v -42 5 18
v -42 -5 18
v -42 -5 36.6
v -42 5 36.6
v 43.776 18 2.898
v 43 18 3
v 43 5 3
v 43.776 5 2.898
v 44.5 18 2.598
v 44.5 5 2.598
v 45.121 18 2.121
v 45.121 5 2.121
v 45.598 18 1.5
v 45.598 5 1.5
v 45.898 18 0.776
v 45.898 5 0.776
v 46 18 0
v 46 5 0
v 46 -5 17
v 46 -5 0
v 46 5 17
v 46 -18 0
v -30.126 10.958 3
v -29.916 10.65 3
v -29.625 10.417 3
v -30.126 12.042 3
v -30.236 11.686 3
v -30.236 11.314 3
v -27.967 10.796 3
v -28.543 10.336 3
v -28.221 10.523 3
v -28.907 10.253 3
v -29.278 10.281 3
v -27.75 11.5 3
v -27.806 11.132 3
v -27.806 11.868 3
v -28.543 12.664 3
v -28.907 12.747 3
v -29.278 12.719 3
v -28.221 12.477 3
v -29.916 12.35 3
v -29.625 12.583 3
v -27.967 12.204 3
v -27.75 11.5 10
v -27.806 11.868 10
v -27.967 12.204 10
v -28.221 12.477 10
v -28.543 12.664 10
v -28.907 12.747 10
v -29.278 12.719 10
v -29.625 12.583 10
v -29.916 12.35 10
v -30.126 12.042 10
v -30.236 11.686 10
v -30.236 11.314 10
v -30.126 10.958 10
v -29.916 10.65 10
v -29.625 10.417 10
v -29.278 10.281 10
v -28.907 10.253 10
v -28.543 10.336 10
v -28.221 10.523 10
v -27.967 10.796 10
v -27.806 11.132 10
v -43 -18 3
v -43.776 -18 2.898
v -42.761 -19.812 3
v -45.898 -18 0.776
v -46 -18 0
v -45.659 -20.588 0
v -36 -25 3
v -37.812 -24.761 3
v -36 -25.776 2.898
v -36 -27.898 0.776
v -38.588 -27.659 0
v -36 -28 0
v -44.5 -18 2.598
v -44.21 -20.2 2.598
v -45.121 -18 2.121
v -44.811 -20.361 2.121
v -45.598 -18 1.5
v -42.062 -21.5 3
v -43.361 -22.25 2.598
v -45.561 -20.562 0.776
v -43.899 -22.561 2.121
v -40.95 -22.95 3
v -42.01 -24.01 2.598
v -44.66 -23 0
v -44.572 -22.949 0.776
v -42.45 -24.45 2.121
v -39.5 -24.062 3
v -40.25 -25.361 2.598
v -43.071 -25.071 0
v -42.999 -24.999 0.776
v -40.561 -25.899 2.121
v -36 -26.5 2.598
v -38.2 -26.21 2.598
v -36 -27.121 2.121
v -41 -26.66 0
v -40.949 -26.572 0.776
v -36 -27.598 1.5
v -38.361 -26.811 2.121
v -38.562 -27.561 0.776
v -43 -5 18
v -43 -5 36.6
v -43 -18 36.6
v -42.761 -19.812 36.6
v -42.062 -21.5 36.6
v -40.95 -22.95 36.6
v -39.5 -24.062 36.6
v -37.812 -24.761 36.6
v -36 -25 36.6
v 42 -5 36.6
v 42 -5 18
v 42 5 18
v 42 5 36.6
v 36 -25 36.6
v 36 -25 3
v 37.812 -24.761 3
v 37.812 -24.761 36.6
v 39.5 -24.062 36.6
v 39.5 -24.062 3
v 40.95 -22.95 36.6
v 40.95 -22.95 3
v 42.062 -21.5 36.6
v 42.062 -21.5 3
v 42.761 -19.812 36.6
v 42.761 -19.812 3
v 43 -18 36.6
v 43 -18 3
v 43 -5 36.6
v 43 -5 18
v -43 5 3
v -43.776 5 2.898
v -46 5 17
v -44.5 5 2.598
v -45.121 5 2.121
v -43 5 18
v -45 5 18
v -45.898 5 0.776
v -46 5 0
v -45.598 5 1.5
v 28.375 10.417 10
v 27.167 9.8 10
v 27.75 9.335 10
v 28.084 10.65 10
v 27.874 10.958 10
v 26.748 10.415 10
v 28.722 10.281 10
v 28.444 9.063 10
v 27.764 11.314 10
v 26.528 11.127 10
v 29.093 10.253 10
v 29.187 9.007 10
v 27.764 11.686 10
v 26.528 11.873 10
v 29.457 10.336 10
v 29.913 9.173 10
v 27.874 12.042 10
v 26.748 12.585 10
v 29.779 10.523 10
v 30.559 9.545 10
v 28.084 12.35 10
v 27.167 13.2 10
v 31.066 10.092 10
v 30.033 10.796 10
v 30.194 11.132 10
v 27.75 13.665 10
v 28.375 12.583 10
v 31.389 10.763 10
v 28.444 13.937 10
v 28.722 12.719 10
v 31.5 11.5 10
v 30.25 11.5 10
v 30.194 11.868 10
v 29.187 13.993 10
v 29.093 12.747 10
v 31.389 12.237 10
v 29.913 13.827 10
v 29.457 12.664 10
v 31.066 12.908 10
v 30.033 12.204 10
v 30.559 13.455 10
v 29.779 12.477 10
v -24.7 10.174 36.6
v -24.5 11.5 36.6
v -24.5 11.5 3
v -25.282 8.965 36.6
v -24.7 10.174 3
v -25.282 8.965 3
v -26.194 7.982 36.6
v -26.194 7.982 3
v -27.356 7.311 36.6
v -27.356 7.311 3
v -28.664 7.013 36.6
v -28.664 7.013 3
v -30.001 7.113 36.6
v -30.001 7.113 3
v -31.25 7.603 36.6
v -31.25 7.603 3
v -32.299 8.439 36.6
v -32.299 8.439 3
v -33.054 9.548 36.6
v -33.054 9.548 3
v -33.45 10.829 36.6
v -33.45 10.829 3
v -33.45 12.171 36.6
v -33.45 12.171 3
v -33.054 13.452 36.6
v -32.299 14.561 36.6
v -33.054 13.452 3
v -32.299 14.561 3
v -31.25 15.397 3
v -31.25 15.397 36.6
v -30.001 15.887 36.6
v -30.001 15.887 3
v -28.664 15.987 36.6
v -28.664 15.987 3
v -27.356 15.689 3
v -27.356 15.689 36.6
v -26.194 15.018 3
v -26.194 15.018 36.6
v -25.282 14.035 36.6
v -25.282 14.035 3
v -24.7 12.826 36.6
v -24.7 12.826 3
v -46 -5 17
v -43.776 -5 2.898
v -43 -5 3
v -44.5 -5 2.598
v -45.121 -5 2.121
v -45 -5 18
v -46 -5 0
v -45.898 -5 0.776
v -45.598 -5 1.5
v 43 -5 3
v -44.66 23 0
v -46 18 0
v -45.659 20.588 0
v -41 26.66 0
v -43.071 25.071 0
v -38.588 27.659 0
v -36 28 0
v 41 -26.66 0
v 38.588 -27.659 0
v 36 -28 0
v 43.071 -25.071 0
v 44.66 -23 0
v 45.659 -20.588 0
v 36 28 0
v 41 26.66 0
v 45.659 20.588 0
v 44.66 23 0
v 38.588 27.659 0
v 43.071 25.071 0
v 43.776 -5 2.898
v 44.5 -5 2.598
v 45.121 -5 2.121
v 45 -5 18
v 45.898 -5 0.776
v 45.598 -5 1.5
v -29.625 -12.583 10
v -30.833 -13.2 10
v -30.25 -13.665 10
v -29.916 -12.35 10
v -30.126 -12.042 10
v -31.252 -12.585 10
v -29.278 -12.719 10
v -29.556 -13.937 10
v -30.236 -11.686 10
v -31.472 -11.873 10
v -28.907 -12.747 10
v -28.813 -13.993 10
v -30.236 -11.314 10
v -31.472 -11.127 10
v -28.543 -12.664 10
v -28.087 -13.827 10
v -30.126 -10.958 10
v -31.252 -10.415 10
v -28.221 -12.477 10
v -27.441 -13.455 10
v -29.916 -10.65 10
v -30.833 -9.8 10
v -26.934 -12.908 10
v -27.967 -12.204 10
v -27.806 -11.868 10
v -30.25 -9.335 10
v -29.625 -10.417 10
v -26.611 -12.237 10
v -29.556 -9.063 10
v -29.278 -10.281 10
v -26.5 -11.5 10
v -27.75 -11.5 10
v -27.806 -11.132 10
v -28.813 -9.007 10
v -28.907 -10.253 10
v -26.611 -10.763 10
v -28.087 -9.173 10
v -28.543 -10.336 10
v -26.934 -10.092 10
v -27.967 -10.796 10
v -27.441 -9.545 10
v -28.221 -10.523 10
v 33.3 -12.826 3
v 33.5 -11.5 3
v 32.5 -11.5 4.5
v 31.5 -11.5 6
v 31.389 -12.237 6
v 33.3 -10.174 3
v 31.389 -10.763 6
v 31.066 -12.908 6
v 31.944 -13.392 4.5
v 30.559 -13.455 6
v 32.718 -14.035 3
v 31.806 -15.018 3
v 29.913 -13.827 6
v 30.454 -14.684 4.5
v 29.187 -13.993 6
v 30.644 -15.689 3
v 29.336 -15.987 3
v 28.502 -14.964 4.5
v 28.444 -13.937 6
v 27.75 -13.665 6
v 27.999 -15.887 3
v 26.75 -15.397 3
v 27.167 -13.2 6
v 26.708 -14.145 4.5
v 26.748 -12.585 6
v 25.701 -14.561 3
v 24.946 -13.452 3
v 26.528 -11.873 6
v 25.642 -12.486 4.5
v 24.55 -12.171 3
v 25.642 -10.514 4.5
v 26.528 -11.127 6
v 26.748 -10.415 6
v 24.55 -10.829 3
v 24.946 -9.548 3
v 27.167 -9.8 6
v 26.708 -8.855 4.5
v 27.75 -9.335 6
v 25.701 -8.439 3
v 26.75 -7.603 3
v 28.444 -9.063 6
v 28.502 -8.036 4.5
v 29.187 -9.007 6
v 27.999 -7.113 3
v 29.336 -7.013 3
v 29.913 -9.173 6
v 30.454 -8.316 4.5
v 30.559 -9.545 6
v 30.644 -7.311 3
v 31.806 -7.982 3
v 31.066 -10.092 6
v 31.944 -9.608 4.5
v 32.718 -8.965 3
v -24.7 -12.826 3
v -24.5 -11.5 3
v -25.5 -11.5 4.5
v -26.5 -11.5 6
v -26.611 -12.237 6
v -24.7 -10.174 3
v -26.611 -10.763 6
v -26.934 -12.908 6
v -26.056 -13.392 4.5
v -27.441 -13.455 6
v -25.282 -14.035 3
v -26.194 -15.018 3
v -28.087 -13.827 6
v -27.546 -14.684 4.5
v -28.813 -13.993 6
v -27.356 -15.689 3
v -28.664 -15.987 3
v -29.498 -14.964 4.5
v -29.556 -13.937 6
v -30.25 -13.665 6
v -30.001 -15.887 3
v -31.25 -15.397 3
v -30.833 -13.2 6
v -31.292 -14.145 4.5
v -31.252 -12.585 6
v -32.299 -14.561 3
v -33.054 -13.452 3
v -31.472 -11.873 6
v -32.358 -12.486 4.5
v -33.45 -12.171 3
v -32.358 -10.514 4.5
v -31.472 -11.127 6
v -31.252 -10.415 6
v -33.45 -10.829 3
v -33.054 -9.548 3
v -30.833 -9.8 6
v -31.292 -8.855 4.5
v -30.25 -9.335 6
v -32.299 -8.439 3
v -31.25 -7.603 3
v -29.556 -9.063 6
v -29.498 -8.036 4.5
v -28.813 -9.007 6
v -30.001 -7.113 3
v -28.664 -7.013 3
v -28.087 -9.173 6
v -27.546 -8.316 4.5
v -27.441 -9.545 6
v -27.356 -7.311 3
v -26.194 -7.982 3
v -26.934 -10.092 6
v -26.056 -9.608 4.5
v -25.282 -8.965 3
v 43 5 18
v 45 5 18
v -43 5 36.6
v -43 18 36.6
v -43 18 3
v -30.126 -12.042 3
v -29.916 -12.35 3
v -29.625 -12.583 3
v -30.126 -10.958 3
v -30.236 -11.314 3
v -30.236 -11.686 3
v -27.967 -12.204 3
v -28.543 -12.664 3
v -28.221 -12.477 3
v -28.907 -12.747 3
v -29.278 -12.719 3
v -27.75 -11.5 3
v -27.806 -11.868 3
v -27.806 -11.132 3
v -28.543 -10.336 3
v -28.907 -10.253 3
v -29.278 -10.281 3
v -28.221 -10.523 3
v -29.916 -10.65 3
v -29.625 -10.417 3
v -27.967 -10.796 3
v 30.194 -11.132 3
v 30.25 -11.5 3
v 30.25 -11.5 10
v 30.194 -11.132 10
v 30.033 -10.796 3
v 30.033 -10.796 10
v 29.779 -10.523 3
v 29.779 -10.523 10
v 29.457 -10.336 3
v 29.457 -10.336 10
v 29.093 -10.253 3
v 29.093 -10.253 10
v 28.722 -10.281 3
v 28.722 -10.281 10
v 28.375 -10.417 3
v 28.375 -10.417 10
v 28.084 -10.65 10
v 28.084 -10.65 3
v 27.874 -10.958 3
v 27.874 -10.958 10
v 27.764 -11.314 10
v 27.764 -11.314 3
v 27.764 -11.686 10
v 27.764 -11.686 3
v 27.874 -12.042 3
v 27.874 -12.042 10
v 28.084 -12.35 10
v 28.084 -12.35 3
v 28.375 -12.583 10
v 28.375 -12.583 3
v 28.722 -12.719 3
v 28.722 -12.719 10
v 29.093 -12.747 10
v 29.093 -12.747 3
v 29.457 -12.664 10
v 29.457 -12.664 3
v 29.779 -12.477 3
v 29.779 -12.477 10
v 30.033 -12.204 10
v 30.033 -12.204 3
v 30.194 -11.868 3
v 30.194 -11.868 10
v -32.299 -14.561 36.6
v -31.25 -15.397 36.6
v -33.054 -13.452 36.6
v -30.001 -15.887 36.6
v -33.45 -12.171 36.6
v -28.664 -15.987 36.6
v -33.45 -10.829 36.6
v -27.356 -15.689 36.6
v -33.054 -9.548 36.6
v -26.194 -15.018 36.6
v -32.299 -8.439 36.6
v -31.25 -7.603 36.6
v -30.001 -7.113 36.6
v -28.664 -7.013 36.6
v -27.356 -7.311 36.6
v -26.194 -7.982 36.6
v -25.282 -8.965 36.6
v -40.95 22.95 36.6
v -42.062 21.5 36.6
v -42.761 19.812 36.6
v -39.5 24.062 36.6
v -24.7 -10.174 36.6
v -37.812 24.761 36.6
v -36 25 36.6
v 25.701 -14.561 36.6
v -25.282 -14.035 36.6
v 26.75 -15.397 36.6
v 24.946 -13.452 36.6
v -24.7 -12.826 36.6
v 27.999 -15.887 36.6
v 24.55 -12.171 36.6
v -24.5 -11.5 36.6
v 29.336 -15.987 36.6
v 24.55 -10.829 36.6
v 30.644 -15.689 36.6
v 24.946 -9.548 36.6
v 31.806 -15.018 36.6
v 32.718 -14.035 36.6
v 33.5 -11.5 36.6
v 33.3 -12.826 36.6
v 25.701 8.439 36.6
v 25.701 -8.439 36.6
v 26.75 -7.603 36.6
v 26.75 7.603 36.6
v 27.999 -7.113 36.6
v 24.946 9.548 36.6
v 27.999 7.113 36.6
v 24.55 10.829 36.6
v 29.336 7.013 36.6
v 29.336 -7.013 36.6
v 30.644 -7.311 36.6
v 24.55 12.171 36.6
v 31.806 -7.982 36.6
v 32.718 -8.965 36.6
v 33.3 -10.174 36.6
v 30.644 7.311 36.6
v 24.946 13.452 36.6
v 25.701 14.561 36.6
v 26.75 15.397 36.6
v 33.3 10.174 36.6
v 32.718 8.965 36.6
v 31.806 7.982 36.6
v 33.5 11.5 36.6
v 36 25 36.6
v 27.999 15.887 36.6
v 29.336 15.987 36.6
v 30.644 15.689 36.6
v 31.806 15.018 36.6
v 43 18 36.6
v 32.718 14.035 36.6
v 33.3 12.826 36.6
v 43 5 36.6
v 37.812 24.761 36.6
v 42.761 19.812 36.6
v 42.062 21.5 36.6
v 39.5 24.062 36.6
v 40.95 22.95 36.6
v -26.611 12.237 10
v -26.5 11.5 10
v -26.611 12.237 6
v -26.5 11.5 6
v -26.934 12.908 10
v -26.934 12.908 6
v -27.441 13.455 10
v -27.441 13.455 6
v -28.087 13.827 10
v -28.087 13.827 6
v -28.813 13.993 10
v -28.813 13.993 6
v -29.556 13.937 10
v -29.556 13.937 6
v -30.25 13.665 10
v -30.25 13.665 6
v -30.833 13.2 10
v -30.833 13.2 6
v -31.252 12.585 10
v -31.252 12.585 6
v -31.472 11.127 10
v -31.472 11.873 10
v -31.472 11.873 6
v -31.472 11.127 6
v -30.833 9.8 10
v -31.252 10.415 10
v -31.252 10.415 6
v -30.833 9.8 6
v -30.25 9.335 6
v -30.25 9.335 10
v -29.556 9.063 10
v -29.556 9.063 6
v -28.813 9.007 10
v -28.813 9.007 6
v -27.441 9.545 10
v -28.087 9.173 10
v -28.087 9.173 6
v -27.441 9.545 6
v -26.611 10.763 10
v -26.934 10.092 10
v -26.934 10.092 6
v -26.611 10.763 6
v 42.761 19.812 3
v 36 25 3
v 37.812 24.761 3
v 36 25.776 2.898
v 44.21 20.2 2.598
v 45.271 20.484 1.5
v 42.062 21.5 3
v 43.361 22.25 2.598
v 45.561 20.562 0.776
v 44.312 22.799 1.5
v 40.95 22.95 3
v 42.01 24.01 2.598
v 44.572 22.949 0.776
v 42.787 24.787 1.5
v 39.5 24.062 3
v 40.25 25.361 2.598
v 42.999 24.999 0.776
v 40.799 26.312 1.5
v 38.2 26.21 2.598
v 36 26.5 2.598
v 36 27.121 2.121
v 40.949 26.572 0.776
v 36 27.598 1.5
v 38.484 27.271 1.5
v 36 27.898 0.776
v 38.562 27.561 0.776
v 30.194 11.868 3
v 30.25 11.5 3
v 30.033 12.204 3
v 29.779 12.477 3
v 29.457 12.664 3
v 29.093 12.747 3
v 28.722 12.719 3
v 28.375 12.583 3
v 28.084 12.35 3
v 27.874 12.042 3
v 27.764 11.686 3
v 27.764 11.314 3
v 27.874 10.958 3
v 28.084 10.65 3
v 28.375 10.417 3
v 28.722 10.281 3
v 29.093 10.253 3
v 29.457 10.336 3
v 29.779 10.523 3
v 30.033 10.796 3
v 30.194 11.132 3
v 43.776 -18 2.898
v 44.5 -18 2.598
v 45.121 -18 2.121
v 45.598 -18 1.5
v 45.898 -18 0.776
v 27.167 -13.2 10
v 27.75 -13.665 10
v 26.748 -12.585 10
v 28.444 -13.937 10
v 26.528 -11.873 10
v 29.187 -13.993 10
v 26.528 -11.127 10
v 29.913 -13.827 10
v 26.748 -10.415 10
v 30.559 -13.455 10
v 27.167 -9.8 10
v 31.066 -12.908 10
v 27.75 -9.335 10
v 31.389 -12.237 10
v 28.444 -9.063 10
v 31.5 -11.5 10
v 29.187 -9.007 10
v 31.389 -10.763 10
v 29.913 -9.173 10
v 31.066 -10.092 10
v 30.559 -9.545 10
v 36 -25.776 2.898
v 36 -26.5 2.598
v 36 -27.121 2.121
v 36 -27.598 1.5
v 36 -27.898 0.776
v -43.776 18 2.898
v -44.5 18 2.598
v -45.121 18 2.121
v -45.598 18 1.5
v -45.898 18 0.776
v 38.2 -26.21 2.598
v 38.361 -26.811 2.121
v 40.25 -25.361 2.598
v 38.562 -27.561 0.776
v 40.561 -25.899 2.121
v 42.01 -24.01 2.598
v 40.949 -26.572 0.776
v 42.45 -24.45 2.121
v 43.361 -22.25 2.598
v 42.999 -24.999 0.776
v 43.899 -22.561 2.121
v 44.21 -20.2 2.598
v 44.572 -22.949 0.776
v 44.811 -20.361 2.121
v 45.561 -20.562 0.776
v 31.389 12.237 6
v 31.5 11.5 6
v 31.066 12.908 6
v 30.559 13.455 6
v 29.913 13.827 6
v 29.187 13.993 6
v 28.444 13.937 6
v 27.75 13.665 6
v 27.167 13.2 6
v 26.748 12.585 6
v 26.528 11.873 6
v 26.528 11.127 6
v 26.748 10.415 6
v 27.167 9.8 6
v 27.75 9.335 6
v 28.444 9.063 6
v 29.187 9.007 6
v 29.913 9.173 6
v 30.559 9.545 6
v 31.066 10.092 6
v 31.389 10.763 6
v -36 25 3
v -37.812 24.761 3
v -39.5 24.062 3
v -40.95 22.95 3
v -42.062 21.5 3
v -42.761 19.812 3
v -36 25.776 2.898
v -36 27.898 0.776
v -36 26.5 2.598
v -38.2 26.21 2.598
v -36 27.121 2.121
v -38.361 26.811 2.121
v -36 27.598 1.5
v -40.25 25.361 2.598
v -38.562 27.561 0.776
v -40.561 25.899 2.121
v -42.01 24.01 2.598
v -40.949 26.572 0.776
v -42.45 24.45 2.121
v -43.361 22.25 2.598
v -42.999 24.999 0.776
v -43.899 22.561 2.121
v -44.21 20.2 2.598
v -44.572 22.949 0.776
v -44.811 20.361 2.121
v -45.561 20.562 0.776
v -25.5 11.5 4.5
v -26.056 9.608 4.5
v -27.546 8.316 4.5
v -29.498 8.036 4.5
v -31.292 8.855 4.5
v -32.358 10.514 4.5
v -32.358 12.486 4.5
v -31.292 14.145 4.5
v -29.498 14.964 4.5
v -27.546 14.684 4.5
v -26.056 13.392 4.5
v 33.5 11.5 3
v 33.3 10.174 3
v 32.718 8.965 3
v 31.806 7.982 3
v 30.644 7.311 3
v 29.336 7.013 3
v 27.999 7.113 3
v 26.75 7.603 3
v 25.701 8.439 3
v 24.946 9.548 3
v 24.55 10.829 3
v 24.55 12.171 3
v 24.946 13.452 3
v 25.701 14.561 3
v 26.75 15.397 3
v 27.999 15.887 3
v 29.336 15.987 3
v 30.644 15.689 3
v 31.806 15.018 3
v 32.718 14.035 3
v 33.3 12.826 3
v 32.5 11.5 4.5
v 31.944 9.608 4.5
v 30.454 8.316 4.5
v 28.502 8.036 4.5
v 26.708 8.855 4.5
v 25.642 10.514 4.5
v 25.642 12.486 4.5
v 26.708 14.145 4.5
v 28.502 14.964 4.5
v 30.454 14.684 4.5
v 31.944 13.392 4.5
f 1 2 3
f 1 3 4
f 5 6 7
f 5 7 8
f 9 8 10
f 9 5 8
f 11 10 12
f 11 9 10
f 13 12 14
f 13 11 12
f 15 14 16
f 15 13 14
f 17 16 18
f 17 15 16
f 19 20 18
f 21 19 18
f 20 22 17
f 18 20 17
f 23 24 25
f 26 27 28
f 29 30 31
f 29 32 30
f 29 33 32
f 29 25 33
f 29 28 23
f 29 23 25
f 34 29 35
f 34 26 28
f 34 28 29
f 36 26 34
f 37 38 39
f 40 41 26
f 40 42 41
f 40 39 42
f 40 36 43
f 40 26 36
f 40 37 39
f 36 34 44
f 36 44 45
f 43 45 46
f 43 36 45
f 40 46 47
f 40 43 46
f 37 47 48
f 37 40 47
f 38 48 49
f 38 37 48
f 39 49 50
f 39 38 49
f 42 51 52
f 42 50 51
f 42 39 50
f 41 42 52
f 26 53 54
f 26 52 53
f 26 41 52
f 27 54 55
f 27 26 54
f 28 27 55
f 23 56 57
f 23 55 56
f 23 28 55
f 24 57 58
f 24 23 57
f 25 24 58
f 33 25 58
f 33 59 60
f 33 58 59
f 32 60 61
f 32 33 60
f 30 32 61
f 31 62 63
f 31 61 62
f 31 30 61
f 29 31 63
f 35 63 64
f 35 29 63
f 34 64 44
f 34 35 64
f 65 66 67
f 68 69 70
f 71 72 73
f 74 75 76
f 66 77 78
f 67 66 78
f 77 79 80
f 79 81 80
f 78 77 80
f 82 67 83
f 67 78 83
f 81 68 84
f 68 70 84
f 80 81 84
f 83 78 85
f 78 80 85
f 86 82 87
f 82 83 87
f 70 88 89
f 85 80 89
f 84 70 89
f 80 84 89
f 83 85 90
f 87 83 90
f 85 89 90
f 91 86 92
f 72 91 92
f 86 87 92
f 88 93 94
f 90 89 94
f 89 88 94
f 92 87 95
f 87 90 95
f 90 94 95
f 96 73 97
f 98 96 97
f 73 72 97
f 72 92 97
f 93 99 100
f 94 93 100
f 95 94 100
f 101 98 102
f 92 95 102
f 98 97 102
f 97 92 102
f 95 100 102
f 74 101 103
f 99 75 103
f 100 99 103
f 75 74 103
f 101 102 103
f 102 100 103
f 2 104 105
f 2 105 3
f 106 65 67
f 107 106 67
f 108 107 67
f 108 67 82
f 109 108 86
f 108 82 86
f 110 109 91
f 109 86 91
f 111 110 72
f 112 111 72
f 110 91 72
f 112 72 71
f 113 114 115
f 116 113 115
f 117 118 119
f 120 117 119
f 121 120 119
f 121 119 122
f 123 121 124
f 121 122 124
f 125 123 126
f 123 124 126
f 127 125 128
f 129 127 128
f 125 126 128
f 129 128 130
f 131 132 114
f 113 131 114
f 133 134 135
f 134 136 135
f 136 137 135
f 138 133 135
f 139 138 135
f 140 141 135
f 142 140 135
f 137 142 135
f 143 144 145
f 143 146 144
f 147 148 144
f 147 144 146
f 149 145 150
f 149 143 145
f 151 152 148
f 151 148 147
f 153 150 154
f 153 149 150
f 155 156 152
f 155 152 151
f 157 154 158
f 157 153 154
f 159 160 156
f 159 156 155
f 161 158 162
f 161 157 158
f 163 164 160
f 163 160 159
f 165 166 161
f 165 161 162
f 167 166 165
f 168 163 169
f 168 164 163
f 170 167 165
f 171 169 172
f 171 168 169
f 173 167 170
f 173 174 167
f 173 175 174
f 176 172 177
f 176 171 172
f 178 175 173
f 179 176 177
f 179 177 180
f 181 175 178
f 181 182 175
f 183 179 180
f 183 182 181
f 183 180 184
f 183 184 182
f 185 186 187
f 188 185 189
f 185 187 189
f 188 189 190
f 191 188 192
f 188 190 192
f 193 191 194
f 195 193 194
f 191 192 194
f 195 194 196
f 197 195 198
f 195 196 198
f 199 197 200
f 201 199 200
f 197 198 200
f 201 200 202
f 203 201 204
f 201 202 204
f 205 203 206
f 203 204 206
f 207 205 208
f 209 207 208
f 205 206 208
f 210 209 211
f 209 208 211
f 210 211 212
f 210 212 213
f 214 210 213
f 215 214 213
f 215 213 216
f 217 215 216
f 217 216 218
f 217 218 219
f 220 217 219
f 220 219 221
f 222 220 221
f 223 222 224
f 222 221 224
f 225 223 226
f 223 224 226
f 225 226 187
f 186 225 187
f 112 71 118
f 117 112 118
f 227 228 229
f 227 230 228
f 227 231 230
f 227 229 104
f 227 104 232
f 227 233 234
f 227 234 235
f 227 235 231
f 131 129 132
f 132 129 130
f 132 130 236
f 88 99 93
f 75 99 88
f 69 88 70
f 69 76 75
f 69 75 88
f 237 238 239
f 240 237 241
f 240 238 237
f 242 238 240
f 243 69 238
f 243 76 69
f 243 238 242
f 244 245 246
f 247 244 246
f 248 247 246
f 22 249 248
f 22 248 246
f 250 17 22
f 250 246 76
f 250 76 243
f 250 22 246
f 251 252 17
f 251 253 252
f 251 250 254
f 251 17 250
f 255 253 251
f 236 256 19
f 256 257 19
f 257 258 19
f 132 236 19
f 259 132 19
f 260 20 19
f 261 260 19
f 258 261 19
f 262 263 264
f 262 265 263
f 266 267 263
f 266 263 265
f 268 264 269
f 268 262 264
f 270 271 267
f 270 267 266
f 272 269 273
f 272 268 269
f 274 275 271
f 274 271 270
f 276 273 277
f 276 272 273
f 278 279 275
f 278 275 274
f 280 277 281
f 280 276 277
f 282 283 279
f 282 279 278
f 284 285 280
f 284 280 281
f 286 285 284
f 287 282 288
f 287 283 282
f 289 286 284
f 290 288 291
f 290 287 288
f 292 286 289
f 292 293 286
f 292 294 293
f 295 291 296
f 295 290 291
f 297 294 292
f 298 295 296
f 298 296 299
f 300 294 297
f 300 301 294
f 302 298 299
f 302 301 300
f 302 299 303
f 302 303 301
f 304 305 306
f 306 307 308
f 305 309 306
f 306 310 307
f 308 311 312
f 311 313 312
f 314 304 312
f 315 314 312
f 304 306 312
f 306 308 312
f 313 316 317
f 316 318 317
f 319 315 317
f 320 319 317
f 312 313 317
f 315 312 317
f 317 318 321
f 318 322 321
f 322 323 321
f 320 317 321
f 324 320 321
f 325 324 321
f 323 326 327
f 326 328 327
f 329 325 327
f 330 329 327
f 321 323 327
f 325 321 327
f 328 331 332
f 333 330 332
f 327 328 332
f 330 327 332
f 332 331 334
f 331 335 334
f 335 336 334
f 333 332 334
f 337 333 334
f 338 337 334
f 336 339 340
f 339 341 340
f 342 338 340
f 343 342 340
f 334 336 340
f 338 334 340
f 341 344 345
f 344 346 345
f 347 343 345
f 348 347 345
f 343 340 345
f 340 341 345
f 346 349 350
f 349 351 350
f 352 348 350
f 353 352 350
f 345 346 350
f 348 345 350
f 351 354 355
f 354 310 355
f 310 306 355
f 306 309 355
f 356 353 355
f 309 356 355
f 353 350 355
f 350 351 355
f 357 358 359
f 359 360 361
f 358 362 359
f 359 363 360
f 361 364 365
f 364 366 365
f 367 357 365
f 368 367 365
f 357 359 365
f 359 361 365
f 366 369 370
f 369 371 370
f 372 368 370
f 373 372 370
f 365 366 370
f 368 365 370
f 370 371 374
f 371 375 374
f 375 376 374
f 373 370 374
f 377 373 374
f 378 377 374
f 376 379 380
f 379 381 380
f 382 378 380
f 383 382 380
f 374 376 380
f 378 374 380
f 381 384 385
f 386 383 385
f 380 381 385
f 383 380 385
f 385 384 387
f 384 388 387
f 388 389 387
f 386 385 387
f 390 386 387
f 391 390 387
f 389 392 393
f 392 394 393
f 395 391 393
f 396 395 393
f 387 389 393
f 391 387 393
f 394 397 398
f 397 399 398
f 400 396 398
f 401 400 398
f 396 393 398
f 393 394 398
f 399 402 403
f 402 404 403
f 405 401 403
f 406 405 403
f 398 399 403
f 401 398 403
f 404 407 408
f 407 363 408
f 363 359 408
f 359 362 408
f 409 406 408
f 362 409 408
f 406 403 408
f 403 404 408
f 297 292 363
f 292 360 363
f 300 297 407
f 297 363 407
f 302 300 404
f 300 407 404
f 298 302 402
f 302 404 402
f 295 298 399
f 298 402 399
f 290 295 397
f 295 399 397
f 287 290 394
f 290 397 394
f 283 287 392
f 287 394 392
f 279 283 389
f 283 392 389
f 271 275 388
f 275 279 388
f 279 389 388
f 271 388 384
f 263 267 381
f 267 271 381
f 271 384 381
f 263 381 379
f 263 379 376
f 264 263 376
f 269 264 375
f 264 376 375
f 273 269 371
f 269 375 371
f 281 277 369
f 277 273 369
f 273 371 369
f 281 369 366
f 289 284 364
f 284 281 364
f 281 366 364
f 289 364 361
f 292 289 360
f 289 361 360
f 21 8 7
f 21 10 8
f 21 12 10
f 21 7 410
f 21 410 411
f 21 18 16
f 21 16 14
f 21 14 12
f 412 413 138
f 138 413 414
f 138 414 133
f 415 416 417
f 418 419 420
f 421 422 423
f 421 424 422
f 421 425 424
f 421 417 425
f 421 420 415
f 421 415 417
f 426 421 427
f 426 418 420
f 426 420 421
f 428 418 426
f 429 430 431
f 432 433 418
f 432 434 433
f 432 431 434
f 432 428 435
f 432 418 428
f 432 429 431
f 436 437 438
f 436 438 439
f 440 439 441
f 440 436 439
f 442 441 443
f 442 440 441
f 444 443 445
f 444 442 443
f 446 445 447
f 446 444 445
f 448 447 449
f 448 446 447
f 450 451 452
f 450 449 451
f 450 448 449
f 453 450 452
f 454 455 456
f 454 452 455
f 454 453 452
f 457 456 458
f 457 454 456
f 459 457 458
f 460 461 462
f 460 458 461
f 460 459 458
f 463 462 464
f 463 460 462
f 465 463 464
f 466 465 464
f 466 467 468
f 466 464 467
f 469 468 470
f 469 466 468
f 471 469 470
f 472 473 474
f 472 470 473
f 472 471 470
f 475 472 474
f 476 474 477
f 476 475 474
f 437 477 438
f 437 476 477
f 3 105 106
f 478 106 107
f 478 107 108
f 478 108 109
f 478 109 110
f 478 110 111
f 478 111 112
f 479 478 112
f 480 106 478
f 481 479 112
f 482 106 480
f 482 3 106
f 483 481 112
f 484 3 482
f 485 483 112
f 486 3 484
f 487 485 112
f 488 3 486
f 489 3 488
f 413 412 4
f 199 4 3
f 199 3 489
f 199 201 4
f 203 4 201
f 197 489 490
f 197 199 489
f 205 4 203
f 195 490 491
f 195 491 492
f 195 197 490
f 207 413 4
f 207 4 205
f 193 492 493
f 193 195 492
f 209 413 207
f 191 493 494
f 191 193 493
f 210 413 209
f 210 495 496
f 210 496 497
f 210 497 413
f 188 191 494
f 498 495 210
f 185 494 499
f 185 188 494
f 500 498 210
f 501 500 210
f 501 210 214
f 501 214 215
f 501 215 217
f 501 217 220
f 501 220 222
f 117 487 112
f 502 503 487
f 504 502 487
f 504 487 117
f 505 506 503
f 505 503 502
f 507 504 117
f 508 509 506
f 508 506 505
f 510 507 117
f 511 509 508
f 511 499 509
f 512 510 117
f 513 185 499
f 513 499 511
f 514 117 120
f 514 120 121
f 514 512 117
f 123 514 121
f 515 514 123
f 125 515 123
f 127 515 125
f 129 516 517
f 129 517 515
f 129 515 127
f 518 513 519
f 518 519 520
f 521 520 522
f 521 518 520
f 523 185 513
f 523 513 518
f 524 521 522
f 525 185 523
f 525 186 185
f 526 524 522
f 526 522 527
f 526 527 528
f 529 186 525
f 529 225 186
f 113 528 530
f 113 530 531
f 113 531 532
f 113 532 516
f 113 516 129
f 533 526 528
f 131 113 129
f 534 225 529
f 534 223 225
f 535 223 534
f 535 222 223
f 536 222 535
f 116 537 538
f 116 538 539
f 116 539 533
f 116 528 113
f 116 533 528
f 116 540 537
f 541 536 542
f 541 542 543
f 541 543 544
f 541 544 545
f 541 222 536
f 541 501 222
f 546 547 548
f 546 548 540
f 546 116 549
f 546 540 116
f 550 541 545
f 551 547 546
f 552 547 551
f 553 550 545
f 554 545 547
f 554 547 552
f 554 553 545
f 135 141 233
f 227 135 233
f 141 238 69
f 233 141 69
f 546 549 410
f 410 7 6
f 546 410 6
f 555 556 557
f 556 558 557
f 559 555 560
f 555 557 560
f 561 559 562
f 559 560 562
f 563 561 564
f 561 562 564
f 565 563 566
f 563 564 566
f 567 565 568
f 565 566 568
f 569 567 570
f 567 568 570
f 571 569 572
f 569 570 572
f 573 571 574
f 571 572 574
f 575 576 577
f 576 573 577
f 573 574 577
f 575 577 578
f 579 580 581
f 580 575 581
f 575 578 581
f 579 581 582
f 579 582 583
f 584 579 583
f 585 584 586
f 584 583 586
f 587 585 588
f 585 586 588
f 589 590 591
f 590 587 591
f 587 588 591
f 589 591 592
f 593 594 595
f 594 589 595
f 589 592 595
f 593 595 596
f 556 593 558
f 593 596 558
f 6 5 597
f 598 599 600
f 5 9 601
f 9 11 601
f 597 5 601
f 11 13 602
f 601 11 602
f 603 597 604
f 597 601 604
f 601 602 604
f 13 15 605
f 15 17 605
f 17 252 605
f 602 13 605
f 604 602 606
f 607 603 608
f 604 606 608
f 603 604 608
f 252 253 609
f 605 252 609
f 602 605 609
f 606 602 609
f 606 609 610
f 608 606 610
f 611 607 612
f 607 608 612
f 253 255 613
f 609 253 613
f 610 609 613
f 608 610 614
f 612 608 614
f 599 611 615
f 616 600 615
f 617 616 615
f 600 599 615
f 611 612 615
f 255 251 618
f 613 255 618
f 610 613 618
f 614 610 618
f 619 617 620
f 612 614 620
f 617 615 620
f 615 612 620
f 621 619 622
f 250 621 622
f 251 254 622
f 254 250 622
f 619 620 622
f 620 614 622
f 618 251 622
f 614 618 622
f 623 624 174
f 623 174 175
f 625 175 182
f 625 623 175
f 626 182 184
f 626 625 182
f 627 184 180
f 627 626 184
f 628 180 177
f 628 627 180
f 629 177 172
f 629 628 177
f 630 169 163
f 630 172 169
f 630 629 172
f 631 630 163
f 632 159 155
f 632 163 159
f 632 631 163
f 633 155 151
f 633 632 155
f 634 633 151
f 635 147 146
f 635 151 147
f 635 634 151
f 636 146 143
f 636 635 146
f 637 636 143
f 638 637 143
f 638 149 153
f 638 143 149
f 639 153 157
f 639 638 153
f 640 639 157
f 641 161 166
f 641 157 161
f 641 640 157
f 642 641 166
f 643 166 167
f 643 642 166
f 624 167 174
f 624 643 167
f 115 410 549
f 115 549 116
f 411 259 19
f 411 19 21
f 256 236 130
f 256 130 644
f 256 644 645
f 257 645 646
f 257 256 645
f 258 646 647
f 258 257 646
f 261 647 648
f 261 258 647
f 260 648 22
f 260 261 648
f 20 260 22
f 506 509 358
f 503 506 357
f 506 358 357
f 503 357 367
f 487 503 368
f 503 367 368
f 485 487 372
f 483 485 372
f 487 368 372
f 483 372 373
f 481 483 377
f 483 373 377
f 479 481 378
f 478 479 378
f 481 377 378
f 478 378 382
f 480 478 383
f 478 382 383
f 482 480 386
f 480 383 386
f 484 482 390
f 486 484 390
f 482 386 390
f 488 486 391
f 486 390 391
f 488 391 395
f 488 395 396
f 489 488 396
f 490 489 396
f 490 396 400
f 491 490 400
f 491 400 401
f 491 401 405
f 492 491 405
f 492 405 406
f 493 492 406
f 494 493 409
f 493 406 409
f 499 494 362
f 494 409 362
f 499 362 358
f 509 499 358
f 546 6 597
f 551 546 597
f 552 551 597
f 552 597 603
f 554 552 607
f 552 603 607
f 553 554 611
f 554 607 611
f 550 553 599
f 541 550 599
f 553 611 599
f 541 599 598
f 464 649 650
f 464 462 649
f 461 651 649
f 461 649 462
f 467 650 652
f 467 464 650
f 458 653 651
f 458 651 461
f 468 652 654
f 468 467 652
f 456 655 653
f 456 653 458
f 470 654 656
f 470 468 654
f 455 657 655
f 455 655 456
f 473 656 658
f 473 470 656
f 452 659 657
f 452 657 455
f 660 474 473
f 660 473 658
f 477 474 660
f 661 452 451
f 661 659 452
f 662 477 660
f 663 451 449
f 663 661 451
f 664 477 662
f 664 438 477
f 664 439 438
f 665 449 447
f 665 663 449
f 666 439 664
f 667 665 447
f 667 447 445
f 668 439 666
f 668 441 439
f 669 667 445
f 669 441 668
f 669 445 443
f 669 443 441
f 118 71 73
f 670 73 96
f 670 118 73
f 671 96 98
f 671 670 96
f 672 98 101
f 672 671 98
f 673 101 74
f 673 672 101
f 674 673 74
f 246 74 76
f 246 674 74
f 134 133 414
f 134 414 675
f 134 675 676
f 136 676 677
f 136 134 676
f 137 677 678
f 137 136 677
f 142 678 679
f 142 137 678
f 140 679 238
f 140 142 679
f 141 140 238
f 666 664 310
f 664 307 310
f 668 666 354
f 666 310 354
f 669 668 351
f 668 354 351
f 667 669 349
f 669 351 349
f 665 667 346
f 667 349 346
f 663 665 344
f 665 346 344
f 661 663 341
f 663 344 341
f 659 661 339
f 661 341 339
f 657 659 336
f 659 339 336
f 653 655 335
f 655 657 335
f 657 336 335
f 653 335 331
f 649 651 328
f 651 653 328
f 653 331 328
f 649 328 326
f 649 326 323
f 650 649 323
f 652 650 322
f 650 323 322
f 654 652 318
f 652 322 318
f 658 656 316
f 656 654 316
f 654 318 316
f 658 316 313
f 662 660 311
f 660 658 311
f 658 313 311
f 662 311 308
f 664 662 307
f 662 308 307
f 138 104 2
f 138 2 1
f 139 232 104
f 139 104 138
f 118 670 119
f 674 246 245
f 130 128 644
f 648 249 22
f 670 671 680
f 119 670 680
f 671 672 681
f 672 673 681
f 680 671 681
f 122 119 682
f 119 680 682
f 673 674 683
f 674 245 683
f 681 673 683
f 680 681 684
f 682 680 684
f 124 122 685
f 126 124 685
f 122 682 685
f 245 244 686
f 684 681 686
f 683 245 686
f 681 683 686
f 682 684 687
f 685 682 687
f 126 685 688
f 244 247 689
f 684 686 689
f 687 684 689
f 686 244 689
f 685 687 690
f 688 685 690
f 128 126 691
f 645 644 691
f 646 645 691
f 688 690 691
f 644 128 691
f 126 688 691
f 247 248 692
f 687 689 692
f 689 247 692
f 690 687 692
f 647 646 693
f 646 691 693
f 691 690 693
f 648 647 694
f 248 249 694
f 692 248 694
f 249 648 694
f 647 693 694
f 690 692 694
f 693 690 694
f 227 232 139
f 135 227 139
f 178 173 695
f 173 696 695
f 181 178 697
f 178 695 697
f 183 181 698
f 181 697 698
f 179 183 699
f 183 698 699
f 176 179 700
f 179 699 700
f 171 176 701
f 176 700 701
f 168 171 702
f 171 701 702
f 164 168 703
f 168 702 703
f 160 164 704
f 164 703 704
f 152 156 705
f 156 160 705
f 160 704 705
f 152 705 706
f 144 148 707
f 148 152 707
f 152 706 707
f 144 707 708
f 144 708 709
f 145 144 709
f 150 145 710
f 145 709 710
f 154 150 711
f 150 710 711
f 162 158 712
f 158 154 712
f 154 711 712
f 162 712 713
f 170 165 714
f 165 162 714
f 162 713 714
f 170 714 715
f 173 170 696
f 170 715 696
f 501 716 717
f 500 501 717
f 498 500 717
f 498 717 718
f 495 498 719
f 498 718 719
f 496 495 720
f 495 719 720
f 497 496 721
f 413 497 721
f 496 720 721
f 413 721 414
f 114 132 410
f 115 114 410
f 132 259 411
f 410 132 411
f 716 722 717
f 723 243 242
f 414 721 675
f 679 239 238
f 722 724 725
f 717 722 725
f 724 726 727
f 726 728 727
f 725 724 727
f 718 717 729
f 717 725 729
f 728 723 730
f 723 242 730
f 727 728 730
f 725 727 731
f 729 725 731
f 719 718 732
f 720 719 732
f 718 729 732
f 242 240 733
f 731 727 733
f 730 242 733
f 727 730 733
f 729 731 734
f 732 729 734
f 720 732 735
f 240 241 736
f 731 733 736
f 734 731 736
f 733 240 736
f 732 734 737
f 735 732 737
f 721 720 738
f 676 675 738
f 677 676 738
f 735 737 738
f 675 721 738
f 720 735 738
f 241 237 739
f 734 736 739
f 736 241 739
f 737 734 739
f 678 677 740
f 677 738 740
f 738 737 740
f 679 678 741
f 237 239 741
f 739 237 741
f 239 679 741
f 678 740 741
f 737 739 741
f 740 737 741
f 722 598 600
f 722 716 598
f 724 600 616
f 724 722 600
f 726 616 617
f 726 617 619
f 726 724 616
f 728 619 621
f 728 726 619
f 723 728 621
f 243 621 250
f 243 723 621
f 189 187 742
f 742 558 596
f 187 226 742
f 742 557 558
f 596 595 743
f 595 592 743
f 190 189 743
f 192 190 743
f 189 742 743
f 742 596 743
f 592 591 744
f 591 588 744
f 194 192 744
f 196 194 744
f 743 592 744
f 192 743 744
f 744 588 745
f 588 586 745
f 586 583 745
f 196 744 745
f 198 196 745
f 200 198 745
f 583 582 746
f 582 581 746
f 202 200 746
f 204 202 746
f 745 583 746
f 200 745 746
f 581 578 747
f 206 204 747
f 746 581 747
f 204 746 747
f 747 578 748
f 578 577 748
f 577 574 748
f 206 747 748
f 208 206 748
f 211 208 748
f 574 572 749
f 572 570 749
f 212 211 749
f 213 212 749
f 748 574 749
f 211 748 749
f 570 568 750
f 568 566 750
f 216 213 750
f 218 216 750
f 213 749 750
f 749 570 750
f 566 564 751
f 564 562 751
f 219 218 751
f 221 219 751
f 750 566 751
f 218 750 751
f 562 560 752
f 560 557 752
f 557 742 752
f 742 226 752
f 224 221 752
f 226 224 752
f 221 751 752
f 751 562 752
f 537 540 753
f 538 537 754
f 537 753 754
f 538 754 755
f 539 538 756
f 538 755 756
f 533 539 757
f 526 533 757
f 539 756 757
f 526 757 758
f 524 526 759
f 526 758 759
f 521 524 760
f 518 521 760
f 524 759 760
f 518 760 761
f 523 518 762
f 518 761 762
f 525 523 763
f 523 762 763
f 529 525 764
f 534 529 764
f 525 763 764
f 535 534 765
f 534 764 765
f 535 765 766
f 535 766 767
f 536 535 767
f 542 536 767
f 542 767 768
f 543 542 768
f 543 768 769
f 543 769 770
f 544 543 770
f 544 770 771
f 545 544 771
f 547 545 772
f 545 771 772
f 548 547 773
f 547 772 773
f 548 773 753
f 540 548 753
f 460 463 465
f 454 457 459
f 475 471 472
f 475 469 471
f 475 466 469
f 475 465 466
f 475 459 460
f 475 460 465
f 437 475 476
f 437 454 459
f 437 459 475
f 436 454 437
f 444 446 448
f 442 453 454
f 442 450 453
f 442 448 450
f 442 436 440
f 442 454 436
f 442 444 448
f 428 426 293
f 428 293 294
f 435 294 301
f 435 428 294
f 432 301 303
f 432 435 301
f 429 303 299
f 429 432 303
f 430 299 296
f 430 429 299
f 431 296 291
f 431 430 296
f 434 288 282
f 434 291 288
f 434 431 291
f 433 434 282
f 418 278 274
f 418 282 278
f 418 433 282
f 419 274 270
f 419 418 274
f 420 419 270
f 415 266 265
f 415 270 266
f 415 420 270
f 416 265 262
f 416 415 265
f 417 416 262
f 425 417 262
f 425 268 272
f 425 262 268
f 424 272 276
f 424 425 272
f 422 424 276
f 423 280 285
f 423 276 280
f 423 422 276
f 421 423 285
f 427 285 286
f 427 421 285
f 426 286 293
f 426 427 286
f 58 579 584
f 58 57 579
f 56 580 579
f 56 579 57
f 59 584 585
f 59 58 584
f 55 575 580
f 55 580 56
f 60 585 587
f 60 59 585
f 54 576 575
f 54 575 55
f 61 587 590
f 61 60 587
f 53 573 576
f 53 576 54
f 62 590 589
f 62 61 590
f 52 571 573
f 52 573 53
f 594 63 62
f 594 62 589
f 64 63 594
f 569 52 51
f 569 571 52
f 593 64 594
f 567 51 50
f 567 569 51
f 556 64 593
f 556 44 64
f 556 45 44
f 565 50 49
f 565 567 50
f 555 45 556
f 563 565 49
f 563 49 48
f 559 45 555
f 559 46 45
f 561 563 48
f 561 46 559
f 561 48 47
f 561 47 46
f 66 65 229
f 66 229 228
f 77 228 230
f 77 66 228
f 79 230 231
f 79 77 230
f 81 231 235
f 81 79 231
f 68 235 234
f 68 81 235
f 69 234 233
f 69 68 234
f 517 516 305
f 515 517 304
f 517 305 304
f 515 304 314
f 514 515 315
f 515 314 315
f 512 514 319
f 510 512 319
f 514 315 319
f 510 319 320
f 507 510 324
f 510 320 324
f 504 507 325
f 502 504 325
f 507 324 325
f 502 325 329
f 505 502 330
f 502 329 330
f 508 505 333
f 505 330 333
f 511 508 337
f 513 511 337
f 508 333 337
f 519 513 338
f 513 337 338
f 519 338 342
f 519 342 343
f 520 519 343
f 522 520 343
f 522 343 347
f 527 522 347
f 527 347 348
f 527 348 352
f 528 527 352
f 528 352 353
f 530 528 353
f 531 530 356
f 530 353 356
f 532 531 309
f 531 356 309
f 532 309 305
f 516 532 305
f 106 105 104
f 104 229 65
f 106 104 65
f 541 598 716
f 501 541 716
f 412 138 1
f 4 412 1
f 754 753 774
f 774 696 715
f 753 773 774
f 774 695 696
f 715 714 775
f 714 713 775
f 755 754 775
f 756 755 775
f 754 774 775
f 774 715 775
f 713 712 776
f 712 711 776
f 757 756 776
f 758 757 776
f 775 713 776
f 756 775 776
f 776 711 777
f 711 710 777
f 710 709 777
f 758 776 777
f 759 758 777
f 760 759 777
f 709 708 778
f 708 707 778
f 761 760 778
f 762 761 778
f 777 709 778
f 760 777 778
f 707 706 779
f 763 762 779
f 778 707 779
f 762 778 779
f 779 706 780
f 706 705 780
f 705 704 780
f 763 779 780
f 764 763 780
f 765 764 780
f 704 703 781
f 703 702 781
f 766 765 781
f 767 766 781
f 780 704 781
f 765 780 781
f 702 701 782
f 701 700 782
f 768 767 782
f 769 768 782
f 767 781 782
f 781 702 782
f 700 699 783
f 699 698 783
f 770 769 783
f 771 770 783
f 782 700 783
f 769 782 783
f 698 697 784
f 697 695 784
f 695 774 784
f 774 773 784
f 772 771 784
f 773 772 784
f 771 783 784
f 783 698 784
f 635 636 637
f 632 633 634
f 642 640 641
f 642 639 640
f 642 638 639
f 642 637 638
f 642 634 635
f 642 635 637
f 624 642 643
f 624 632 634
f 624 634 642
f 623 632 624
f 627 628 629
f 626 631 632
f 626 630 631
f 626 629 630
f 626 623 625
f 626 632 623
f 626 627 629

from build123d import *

# Parameters (mm, degrees)
F2_DEPTH  = 3
F1_R      = 2.5
F1_R_2    = 1.25
F3_DEPTH  = 10
F4_SIZE2  = 3
F4_SIZE   = 2
F5_R      = 2.99999
F7_W      = 10
F7_H      = 18
F8_DEPTH  = 4
F10_SIZE  = 1
F11_DEPTH = 33.6


# Not quite as in the source:
# - a fillet or chamfer is up to 0.001 mm smaller than in the source, because OpenCascade refuses the exact size


with BuildPart() as f2:
    # F0 (on Top) → F2 (new body)
    with BuildSketch(Plane.XY):
        with BuildLine():
            ThreePointArc((46, 18), (43.0710678119, 25.0710678119), (36, 28))
            Line((36, 28), (-36, 28))
            ThreePointArc((-36, 28), (-43.0710678119, 25.0710678119), (-46, 18))
            Line((-46, 18), (-46, -18))
            ThreePointArc((-46, -18), (-43.0710678119, -25.0710678119), (-36, -28))
            Line((-36, -28), (36, -28))
            ThreePointArc((36, -28), (43.0710678119, -25.0710678119), (46, -18))
            Line((46, -18), (46, 18))
        make_face()
    extrude(amount=F2_DEPTH)

    # F1 (on Top) → F3 (join)
    with BuildSketch(Plane.XY):
        with Locations((-29, 11.5)):
            Circle(F1_R)
        with Locations((-29, 11.5)):
            Circle(F1_R_2, mode=Mode.SUBTRACT)
        with Locations((29, 11.5)):
            Circle(F1_R)
        with Locations((29, 11.5)):
            Circle(F1_R_2, mode=Mode.SUBTRACT)
        with Locations((-29, -11.5)):
            Circle(F1_R)
        with Locations((-29, -11.5)):
            Circle(F1_R_2, mode=Mode.SUBTRACT)
        with Locations((29, -11.5)):
            Circle(F1_R)
        with Locations((29, -11.5)):
            Circle(F1_R_2, mode=Mode.SUBTRACT)
    extrude(amount=F3_DEPTH)

    # F4
    f4_edges = [f2.edges().sort_by_distance(p)[0] for p in [
        (-31.5, 11.5, 3),
        (26.5, 11.5, 3),
        (26.5, -11.5, 3),
        (-31.5, -11.5, 3),
    ]]
    chamfer(f4_edges, length=F4_SIZE, length2=F4_SIZE2)

    # F5 (radius 3 in the source; OpenCascade refuses exactly that, so slightly less here)
    f5_edges = [f2.edges().sort_by_distance(p)[0] for p in [
        (0, 28, 3),
    ]]
    fillet(f5_edges, radius=F5_R)

    # F7 (on offset) → F8 (join)
    with BuildSketch(Plane.YZ.offset(46)):
        with Locations((0, 9)):
            Rectangle(F7_W, F7_H)
    extrude(amount=-F8_DEPTH)

    # F9: F2 across plane


with BuildPart() as f2_1:
    add(f2.part)
    add(f2.part.mirror(Plane.YZ))

    # F10
    f10_edges = [f2_1.edges().sort_by_distance(p)[0] for p in [
        (-46, 0, 18),
        (46, 0, 18),
    ]]
    chamfer(f10_edges, length=F10_SIZE)

    # F11 (add): a face of the model
    f11_faces = [f2_1.faces().sort_by_distance(p)[0] for p in [
        (0, 0, 3),
    ]]
    extrude(f11_faces, amount=F11_DEPTH)


solid = f2_1.part
